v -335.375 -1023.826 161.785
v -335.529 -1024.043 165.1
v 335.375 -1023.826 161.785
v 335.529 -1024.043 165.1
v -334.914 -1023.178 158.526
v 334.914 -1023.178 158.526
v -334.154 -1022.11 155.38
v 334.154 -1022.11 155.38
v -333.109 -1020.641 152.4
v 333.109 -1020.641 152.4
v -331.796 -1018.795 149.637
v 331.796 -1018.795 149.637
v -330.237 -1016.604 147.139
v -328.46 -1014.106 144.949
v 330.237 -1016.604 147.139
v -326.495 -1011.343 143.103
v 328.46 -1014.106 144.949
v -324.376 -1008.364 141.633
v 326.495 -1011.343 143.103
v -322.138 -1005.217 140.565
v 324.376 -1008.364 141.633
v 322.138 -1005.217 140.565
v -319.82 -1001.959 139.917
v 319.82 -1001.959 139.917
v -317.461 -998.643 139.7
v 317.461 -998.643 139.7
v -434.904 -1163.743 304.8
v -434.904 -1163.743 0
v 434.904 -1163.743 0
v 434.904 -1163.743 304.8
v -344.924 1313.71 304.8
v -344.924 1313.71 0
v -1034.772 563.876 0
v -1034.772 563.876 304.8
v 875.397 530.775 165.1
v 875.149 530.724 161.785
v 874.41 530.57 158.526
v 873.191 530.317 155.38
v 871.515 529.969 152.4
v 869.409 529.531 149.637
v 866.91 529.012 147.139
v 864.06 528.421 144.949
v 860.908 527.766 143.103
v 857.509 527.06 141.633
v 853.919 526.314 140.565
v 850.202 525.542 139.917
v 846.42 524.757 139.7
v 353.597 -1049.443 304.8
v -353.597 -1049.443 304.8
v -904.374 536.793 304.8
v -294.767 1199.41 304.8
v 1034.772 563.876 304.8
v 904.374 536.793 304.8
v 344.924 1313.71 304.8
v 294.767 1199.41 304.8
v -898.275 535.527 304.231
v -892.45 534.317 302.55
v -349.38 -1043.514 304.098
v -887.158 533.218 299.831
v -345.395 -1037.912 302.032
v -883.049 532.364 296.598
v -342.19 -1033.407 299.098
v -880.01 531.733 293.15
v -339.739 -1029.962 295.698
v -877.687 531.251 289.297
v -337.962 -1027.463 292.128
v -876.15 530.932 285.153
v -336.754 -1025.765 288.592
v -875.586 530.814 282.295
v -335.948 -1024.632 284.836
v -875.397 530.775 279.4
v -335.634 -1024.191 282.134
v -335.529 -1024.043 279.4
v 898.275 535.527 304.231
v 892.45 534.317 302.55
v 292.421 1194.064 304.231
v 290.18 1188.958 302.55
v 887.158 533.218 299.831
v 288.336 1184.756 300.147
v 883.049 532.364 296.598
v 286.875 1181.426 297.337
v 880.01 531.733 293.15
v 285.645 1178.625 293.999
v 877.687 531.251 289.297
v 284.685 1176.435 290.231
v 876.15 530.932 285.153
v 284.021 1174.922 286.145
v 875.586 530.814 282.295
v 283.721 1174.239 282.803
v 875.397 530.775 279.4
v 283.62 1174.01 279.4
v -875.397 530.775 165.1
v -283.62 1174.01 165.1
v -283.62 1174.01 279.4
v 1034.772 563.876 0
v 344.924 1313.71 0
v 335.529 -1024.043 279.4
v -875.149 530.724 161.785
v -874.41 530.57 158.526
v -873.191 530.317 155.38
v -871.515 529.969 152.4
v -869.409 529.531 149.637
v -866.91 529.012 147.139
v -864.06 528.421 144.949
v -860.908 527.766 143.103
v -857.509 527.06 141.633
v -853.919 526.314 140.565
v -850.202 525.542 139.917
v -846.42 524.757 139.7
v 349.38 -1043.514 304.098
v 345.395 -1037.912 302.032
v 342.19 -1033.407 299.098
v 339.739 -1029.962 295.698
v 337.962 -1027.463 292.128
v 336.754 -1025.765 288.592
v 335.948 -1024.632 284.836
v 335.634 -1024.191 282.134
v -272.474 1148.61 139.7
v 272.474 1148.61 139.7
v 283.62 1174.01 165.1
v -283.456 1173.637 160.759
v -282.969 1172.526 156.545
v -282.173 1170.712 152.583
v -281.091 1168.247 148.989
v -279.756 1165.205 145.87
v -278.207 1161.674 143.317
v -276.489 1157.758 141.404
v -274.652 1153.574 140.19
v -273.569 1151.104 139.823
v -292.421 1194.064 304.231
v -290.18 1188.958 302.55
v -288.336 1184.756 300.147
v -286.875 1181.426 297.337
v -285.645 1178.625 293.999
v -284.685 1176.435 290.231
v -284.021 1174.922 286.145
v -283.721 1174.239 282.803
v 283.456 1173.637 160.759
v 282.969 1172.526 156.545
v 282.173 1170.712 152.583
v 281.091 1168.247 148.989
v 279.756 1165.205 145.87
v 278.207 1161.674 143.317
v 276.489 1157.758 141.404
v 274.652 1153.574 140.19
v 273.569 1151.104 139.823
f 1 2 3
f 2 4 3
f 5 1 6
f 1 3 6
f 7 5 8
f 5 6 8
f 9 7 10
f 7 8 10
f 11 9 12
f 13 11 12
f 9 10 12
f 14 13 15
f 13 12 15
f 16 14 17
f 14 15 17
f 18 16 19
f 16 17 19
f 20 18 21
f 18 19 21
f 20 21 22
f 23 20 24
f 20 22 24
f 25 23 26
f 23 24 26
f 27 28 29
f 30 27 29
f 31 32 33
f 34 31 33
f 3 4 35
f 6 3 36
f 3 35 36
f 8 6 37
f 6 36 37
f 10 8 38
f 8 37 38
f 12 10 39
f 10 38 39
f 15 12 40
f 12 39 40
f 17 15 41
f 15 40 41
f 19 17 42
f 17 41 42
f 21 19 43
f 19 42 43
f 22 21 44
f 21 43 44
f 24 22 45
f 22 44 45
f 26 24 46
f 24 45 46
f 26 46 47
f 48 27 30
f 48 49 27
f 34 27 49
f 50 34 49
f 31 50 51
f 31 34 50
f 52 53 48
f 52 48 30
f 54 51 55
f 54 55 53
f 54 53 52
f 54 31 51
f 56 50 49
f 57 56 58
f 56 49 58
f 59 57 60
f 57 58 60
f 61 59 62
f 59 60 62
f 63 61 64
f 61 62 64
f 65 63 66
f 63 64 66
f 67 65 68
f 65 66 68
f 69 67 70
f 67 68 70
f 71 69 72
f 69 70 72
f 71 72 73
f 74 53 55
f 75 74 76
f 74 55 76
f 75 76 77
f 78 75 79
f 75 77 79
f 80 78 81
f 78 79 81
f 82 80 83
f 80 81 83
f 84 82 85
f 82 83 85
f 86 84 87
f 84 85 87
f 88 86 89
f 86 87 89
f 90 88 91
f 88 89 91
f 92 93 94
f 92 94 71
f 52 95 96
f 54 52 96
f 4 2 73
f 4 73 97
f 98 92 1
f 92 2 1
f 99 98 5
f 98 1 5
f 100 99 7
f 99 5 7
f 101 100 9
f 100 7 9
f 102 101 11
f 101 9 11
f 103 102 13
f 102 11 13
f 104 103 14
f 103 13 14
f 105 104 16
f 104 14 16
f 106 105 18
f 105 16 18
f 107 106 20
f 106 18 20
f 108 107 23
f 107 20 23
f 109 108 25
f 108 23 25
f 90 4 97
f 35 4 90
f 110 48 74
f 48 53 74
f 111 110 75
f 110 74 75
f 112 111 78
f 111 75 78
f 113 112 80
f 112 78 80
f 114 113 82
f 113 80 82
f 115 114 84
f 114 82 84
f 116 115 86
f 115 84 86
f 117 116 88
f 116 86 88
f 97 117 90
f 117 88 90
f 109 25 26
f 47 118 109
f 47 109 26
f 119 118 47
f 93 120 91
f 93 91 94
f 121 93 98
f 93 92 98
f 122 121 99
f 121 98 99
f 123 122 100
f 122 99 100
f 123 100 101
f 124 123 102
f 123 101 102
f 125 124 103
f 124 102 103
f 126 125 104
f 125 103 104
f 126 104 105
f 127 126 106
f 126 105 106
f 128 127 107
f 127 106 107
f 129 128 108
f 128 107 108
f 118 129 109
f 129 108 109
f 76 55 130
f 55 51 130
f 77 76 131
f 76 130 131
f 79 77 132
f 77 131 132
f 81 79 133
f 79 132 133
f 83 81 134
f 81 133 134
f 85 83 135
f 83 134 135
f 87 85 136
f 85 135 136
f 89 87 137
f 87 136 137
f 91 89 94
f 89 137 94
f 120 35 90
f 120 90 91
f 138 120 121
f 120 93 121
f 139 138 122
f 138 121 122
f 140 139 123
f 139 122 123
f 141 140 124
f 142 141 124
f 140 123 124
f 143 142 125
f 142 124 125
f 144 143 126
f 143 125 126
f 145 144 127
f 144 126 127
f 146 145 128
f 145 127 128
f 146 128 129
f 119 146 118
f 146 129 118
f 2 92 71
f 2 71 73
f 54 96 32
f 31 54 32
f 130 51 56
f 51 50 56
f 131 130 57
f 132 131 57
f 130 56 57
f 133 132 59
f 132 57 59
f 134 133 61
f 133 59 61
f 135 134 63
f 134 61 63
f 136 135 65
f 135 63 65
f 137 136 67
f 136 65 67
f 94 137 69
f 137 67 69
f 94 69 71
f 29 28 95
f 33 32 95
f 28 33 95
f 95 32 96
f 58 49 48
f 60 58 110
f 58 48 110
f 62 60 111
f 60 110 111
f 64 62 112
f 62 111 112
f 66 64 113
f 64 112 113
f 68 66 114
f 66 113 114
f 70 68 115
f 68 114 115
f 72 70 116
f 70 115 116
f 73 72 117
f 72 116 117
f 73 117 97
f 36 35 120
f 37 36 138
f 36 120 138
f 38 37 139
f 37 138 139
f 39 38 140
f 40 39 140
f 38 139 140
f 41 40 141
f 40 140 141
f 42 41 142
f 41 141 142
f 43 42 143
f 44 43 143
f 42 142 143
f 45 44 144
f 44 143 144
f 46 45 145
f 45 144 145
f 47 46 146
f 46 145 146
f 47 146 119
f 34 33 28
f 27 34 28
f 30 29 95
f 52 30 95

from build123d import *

# Parameters (mm, degrees)
F1_DEPTH = 304.8
F2_T     = -139.7
F3_R     = 25.4


# Not quite as in the source:
# - a feature of the source that left no trace in its solid (it failed there, or was rolled back) is left out


with BuildPart() as f1:
    # F0 (on Top) → F1 (new body)
    with BuildSketch(Plane.XY):
        Polygon((-434.9041368839, -1163.7434696012), (0, -1163.7434696012), (434.9041368839, -1163.7434696012), (1034.7719199285, 563.8757253794), (344.9239733095, 1313.7104347737), (0, 1313.7104347737), (-344.9239733095, 1313.7104347737), (-1034.7719199285, 563.8757253794), align=None)
    extrude(amount=F1_DEPTH)

    # F2
    f2_openings = [f1.faces().sort_by_distance(p)[0] for p in [
        (0, 124.086799, 304.8),
    ]]
    offset(amount=F2_T, openings=f2_openings)

    # F3
    f3_edges = [f1.edges().sort_by_distance(p)[0] for p in [
        (-579.508648, 852.392778, 304.8),
        (0, 1174.010435, 304.8),
        (579.508648, 852.392778, 304.8),
        (605.463112, -246.634174, 304.8),
        (0, -1024.04347, 304.8),
        (-605.463112, -246.634174, 304.8),
        (-605.463112, -246.634174, 139.7),
        (0, -1024.04347, 139.7),
        (605.463112, -246.634174, 139.7),
        (579.508648, 852.392778, 139.7),
        (0, 1174.010435, 139.7),
        (-579.508648, 852.392778, 139.7),
    ]]
    fillet(f3_edges, radius=F3_R)


solid = f1.part
